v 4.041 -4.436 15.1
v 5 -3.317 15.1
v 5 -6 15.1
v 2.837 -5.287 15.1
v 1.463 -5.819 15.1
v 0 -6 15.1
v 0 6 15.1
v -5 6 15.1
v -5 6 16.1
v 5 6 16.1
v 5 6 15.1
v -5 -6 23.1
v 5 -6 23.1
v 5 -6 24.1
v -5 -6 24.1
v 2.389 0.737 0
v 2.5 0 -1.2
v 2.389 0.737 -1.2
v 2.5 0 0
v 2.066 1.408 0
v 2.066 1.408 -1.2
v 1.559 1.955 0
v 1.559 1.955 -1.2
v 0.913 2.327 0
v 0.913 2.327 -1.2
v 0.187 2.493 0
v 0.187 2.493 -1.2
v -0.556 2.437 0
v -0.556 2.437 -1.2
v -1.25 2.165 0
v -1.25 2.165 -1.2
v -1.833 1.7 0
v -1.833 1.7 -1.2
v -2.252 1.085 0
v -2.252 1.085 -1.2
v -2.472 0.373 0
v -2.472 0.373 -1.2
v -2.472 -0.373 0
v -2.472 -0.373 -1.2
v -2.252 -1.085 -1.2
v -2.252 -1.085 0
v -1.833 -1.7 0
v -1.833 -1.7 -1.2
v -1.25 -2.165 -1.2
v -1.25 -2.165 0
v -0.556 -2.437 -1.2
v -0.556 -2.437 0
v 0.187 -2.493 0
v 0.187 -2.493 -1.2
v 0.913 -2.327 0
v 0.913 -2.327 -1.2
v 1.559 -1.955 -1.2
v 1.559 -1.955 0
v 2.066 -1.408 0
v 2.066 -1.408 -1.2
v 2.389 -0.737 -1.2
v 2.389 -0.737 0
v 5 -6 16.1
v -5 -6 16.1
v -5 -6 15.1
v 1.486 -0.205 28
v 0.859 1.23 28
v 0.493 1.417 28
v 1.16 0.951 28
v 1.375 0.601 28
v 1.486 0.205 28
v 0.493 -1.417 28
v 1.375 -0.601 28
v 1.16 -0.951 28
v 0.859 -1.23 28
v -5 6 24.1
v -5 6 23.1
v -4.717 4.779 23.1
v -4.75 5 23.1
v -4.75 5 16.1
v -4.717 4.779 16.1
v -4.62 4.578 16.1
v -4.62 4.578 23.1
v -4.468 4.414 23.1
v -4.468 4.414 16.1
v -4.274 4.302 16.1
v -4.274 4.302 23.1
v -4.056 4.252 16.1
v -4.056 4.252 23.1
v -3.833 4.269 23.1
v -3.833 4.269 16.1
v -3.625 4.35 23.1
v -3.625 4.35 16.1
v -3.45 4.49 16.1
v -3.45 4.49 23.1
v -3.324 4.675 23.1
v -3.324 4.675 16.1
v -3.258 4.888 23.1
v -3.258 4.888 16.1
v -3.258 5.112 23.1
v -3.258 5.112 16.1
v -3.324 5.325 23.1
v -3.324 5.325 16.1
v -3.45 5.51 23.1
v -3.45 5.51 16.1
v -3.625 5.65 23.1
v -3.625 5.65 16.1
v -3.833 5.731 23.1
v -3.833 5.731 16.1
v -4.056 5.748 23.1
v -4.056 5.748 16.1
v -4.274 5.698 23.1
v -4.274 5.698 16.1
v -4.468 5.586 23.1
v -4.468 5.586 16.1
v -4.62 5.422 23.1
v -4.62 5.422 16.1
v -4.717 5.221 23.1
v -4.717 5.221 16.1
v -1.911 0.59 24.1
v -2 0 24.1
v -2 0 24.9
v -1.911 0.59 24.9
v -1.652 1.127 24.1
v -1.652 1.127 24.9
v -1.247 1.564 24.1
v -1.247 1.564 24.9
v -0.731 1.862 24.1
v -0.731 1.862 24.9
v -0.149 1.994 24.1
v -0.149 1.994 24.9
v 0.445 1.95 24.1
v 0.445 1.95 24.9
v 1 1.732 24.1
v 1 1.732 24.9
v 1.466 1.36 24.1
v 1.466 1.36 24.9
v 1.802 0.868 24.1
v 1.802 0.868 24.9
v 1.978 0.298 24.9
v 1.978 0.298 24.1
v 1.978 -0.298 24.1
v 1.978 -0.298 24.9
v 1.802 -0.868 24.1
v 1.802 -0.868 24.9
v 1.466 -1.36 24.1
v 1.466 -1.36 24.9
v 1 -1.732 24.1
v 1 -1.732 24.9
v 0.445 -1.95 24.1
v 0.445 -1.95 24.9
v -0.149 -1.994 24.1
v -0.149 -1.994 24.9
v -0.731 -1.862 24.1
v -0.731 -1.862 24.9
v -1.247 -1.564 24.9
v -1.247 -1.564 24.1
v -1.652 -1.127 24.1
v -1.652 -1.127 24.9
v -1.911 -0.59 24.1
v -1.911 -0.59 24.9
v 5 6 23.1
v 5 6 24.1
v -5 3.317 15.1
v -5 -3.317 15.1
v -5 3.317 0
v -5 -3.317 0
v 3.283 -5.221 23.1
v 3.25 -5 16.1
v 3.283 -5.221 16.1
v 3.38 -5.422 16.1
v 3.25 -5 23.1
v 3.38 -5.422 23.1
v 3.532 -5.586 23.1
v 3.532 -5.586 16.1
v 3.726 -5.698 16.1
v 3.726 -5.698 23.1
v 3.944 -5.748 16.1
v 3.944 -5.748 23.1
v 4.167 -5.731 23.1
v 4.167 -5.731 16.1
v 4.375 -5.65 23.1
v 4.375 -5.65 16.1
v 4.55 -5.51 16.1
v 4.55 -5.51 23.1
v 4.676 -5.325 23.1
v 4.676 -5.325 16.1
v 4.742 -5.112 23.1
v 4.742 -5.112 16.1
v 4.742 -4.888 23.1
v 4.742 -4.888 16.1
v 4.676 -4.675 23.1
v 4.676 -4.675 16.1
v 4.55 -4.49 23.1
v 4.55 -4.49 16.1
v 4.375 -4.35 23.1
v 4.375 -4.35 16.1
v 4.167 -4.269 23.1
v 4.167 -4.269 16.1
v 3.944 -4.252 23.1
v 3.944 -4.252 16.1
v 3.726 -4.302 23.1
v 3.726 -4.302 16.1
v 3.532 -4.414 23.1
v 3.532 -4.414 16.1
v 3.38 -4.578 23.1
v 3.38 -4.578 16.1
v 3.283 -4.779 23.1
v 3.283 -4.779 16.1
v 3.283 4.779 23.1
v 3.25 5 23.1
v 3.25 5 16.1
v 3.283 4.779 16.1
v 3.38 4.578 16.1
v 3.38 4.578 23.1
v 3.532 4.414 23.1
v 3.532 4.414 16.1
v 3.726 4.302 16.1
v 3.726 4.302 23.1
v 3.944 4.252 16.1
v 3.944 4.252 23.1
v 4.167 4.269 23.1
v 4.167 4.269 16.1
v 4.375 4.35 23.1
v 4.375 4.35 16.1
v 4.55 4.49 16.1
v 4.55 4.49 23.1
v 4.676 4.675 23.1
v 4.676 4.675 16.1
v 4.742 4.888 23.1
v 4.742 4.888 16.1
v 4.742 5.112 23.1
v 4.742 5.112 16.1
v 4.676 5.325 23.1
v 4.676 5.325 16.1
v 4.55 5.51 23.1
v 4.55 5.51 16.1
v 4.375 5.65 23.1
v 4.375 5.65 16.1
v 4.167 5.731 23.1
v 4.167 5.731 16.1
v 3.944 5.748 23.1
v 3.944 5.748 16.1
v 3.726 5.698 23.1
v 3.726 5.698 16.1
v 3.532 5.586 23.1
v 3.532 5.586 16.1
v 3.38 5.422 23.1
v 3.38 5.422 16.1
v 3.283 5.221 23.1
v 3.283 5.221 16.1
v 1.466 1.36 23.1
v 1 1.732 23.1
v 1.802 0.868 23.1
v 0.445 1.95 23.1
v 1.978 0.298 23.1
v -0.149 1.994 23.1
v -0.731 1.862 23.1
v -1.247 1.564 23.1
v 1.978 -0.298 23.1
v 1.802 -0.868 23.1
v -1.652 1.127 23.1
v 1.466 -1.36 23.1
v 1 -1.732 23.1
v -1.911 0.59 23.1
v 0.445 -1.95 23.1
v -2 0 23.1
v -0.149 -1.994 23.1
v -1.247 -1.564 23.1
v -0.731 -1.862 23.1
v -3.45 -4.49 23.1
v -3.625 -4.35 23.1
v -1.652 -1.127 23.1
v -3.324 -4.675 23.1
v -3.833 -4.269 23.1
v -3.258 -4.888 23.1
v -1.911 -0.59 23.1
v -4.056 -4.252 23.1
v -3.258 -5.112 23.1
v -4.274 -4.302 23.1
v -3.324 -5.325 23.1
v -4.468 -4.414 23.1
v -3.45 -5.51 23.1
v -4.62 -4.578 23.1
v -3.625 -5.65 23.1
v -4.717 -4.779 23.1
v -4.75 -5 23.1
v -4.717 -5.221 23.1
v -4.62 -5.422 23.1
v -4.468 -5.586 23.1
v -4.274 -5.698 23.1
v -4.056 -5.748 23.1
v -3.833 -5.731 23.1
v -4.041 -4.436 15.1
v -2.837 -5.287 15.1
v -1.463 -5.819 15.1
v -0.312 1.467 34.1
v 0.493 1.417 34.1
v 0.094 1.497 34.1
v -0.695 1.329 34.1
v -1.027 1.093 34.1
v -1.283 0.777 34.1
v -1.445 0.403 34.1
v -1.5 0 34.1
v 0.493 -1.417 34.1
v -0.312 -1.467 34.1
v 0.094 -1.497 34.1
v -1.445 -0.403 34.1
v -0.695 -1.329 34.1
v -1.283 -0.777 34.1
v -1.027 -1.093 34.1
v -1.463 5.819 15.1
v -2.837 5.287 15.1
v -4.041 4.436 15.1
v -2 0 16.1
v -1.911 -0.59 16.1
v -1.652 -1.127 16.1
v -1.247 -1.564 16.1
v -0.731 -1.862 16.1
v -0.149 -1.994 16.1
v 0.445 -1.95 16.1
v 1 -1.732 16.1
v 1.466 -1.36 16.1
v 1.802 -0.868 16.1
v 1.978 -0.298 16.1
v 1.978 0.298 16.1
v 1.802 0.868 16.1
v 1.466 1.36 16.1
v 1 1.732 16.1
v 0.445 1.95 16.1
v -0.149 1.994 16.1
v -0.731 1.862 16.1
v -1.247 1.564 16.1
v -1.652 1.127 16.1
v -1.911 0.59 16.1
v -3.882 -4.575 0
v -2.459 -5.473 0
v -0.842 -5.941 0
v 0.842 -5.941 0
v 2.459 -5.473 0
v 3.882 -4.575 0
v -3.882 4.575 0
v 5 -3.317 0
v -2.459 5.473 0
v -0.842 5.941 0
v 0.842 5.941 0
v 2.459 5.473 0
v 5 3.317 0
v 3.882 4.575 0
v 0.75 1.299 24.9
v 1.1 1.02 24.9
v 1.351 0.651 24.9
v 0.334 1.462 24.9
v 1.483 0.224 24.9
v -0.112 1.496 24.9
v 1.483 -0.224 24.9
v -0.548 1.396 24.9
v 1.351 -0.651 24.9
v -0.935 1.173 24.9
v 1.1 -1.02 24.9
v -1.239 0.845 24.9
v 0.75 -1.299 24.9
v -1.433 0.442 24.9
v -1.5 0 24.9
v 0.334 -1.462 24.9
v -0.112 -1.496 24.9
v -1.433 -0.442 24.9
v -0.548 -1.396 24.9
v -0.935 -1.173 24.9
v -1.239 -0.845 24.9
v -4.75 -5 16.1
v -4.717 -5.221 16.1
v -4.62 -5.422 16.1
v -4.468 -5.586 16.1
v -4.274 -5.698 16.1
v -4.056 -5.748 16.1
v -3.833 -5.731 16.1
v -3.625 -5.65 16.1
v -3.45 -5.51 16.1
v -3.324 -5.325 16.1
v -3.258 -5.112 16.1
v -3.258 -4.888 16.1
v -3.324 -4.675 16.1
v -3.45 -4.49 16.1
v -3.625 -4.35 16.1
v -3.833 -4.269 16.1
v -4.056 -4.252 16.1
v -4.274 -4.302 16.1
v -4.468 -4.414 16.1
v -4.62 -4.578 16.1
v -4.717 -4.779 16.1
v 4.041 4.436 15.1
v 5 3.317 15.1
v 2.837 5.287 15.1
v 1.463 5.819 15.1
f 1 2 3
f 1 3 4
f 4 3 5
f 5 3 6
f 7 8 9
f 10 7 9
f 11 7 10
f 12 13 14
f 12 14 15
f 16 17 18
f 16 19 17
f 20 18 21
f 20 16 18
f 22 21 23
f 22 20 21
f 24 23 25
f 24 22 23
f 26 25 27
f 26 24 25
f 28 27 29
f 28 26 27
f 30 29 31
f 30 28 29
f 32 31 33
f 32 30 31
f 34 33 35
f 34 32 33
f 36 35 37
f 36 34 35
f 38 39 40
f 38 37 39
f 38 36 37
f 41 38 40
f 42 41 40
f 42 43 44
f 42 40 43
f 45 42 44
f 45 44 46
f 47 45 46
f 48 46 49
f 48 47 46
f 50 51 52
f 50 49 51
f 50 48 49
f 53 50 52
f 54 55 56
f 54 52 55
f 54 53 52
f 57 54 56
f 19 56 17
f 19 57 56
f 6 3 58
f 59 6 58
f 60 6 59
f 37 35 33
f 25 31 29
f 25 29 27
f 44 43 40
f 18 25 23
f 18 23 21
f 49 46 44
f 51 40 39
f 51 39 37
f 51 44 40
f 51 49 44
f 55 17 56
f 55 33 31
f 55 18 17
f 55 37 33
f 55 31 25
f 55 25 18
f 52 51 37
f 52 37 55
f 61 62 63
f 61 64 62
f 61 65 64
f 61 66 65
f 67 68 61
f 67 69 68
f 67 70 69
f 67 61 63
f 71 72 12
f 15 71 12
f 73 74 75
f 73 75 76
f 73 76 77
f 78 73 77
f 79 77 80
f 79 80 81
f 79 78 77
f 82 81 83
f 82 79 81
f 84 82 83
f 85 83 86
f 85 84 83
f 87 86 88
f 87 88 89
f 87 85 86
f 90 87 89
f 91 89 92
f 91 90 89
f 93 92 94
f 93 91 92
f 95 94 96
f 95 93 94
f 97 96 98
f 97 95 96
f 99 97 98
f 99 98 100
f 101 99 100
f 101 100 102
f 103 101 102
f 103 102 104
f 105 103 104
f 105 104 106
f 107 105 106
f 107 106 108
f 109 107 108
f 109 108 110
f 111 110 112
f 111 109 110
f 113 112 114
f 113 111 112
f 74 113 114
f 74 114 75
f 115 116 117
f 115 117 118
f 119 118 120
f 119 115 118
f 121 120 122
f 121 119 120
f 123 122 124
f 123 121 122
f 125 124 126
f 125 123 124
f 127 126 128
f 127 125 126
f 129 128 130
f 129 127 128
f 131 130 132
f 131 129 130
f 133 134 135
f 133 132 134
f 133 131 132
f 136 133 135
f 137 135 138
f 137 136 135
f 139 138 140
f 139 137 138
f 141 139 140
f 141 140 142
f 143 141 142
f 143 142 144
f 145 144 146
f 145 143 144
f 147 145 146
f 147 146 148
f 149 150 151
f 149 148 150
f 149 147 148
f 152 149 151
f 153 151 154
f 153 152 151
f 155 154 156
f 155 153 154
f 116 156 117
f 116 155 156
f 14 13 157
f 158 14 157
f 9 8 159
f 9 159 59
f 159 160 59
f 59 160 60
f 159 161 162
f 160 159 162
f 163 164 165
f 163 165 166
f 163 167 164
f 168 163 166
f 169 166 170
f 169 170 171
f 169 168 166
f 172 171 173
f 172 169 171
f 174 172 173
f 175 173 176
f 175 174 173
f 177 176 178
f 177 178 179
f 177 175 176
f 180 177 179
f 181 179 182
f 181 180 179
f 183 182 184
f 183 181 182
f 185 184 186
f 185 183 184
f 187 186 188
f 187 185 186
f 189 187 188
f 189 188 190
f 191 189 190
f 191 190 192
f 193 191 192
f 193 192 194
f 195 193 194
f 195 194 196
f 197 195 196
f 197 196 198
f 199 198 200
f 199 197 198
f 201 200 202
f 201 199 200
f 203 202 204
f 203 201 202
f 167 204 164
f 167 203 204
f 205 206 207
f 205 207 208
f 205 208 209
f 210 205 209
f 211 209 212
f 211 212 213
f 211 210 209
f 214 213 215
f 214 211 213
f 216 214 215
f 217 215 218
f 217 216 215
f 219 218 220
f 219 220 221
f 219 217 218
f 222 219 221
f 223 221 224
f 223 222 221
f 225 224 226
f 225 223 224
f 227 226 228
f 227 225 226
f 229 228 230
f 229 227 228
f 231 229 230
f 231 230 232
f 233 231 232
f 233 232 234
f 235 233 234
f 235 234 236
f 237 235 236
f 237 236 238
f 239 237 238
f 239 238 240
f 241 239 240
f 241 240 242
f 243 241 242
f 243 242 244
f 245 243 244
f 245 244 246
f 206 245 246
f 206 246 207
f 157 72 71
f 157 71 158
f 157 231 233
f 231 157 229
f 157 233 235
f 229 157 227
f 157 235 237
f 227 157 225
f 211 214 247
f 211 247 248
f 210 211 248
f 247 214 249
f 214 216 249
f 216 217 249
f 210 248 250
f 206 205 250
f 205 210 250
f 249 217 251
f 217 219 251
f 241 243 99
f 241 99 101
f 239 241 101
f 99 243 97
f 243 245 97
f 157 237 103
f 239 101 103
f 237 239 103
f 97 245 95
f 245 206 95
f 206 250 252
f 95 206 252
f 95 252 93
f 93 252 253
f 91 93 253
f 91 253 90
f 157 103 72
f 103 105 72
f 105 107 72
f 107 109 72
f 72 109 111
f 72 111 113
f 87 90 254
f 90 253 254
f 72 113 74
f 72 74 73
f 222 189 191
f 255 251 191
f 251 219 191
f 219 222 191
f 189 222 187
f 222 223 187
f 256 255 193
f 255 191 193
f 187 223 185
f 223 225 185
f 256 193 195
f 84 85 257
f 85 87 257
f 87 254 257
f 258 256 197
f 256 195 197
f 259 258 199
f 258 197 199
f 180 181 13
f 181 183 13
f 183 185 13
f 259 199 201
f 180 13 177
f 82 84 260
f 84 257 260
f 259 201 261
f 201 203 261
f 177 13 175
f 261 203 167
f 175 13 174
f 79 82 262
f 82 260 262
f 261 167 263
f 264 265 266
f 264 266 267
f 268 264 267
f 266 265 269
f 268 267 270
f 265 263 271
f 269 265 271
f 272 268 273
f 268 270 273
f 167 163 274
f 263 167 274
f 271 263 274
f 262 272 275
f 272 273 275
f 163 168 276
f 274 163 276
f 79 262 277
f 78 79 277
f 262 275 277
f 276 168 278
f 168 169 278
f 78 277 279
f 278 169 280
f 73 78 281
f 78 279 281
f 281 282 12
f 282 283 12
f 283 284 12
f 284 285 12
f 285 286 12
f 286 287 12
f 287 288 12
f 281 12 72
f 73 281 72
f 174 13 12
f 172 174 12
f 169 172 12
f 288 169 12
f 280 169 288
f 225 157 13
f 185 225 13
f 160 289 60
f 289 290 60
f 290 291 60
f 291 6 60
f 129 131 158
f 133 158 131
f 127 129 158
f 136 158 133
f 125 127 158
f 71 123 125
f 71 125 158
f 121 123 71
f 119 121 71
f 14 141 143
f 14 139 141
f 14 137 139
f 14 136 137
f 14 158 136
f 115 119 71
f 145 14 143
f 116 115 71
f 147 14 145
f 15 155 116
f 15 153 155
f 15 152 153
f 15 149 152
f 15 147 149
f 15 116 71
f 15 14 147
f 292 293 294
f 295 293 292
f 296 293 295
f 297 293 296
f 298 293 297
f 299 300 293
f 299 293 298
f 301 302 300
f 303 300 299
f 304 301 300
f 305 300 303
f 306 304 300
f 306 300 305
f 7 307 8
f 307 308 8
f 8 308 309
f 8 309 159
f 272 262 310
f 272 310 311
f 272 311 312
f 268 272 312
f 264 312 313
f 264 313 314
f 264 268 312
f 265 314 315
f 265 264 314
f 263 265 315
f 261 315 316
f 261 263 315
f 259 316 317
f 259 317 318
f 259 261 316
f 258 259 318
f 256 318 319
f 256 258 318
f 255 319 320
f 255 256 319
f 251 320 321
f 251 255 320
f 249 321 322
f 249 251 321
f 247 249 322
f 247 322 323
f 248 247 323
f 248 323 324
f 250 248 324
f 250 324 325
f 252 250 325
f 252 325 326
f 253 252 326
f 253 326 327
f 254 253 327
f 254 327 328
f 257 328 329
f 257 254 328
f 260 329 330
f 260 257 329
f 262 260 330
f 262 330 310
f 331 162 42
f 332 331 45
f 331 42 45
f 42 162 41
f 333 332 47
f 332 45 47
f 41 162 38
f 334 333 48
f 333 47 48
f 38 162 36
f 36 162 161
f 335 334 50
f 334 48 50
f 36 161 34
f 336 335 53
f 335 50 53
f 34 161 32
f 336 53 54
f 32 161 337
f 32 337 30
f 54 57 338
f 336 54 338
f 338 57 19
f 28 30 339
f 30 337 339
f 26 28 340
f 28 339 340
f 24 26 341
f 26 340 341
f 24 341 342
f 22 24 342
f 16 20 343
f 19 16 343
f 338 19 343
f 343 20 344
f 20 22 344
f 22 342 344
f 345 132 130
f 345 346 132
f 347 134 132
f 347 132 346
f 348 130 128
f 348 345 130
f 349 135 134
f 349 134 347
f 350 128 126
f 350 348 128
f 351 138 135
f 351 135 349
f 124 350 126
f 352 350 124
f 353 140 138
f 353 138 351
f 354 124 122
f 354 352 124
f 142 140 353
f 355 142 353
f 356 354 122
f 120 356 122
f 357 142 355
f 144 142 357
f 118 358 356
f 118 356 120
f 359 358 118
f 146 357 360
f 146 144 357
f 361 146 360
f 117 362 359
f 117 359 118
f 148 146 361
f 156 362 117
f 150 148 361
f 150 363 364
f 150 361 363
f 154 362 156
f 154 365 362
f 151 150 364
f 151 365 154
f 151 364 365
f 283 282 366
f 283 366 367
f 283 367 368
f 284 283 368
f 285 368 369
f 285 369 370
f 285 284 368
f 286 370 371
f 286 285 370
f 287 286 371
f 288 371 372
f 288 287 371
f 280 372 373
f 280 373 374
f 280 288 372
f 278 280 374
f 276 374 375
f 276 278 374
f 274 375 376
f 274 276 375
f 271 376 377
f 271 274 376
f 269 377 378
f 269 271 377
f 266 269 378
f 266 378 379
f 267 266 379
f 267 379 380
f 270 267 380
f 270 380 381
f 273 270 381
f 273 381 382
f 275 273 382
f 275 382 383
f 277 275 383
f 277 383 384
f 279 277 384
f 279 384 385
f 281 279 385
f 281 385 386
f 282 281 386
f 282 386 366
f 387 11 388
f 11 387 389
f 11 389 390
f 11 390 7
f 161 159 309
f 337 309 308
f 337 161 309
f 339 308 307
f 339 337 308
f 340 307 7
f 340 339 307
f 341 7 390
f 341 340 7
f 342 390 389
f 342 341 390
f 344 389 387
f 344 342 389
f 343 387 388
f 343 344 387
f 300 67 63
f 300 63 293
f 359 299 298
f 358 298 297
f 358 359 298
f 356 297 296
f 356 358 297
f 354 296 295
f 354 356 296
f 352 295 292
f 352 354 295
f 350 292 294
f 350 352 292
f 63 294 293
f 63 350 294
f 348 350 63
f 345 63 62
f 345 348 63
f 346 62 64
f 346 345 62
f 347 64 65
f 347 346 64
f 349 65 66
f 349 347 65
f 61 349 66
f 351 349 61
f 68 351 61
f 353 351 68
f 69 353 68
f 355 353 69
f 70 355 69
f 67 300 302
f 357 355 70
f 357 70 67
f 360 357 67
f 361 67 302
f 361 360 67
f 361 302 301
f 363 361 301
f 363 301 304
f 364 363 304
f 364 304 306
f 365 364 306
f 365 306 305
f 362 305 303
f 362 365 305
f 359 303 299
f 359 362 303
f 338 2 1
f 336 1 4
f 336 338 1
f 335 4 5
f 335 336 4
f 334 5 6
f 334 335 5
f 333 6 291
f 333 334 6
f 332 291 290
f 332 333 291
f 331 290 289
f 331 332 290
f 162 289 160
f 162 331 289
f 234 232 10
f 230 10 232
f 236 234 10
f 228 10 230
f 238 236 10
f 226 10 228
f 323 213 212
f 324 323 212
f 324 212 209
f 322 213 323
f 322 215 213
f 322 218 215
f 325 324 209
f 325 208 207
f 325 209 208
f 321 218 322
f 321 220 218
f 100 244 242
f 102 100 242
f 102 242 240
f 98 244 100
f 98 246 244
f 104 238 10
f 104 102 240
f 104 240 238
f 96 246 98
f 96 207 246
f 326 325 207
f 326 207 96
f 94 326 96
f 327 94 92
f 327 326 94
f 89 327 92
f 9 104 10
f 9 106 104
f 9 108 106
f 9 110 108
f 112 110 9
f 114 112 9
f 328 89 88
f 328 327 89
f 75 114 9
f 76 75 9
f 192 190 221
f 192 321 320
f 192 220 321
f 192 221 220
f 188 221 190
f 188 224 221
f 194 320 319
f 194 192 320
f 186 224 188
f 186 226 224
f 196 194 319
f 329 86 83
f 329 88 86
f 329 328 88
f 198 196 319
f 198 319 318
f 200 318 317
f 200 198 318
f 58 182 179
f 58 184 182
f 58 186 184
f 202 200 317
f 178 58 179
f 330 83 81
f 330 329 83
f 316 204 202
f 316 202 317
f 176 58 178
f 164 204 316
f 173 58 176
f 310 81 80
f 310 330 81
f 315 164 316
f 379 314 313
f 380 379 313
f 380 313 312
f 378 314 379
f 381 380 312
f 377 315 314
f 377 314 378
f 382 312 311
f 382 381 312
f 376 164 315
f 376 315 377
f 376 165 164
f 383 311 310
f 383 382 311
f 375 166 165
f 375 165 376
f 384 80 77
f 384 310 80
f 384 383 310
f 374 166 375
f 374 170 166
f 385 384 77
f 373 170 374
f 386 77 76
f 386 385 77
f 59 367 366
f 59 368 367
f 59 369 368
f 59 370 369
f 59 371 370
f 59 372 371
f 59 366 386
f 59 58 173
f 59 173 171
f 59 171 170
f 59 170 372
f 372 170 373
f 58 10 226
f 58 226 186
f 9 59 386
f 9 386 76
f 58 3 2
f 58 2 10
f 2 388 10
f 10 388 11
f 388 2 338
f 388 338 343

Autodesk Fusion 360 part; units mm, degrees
sketch "Sketch1" plane through (0, 0, 0) normal (0, 0, 1) x (1, 0, 0)
  circle A0 centre (0, 0) radius 6
  line L0 (-5, 6) -> (5, 6)
  line L1 (5, 6) -> (5, -6)
  line L2 (5, -6) -> (-5, -6)
  line L3 (-5, -6) -> (-5, 6)
  line L4 (-5, 6) -> (5, -6) construction
  line L5 (5, 6) -> (-5, -6) construction
  dimension "d1" = 12
  dimension "d2" = 10
  dimension "d3" = 12
extrude "Extrude1" add sketch "Sketch1" along normal blind 15.1 contours A0 L1 L3
sketch "Sketch2" plane through (0, 0, 15.1) normal (0, 0, 1) x (-1, 0, 0)
  arc A0 (-5, -3.3166) -> (5, -3.3166) centre (0, 0) ccw
  line L0 (5, -3.3166) -> (5, 3.3166)
  arc A1 (5, 3.3166) -> (-5, 3.3166) centre (0, 0) ccw
  line L1 (-5, 3.3166) -> (-5, -3.3166)
  line L2 (5, -6) -> (-5, -6)
  line L3 (-5, -6) -> (-5, 6)
  line L4 (-5, 6) -> (5, 6)
  line L5 (5, 6) -> (5, -6)
  line L6 (5, -6) -> (-5, 6) construction
  line L7 (-5, -6) -> (5, 6) construction
  dimension "d6" = 10
  dimension "d7" = 12
extrude "Extrude2" add sketch "Sketch2" along normal blind 9
sketch "Sketch3" plane through (0, 0, 24.1) normal (0, 0, 1) x (-1, 0, 0)
  line L0 (5, 6) -> (-5, 6)
  line L1 (-5, 6) -> (-5, -6)
  line L2 (-5, -6) -> (5, -6)
  line L3 (5, -6) -> (5, 6)
  circle A0 centre (0, 0) radius 2
  circle A1 centre (0, 0) radius 1.5
  dimension "d10" = 4
  dimension "d11" = 3
extrude "Extrude3" add sketch "Sketch3" along normal blind 0.8 contours A0
extrude "Extrude4" add 1 faces at (-0.567, 0.5383, 24.1) along direction (0, 0, 1) blind 10
extrude "Extrude5" add sketch "Sketch3" along normal blind 10 contours A1
sketch "Sketch4" plane through (0, 0, 0) normal (0, 0, -1) x (1, 0, 0)
  arc A0 (-5, -3.3166) -> (5, -3.3166) centre (0, 0) ccw
  line L0 (5, -3.3166) -> (5, 3.3166)
  arc A1 (5, 3.3166) -> (-5, 3.3166) centre (0, 0) ccw
  line L1 (-5, 3.3166) -> (-5, -3.3166)
  circle A2 centre (0, 0) radius 2.5
  dimension "d18" = 5
extrude "Extrude6" add sketch "Sketch4" along normal blind 1.2 contours A2
sketch "Sketch5" plane through (0, 0, 24.1) normal (0, 0, 1) x (-1, 0, 0)
  line L0 (-4, 5) -> (4, 5)
  line L1 (4, 5) -> (4, -5)
  line L2 (4, -5) -> (-4, -5)
  line L3 (-4, -5) -> (-4, 5)
  line L4 (-4, 5) -> (4, -5) construction
  line L5 (4, 5) -> (-4, -5) construction
  circle A0 centre (4, -5) radius 0.75
  circle A1 centre (-4, -5) radius 0.75
  circle A2 centre (4, 5) radius 0.75
  circle A3 centre (-4, 5) radius 0.75
  circle A4 centre (0, 0) radius 1.5
  dimension "d21" = 1.5
  dimension "d22" = 1.5
  dimension "d23" = 1.5
  dimension "d24" = 1.5
  dimension "d25" = 3
extrude "Extrude7" cut 1 faces at (0.0498, 4.6648, 24.1) along direction (0, 0, -1) blind 7 from surface at 1
extrude "Extrude8" add sketch "Sketch5" against normal blind 8.5 contours L0 L3 A3 | L0 L3 A3 | L0 L1 A2 | L0 L1 A2 | L2 L3 A1 | L2 L3 A1 | L1 L2 A0 | L1 L2 A0 | A4
sketch "Sketch6" plane through (0, 0, 0) normal (0, 1, 0) x (1, 0, 0)
  line L0 (1, -28) -> (3, -28)
  line L1 (3, -28) -> (3, -35)
  line L2 (3, -35) -> (1, -35)
  line L3 (1, -35) -> (1, -28)
sketch "Sketch7" plane through (0, 0, 0) normal (0, 1, 0) x (1, 0, 0)
extrude "Extrude9" cut sketch "Sketch6" along normal blind 8
sketch "Sketch8" plane through (0, 0, 0) normal (0, 1, 0) x (1, 0, 0)
  line L0 (0.4932, -34.2266) -> (2, -34.2266)
  line L1 (2, -34.2266) -> (2, -28)
  line L2 (2, -28) -> (0.4932, -28)
  line L3 (0.4932, -28) -> (0.4932, -34.2266)
extrude "Extrude10" cut sketch "Sketch8" along normal blind 100
extrude "Extrude11" cut sketch "Sketch8" against normal blind 100
